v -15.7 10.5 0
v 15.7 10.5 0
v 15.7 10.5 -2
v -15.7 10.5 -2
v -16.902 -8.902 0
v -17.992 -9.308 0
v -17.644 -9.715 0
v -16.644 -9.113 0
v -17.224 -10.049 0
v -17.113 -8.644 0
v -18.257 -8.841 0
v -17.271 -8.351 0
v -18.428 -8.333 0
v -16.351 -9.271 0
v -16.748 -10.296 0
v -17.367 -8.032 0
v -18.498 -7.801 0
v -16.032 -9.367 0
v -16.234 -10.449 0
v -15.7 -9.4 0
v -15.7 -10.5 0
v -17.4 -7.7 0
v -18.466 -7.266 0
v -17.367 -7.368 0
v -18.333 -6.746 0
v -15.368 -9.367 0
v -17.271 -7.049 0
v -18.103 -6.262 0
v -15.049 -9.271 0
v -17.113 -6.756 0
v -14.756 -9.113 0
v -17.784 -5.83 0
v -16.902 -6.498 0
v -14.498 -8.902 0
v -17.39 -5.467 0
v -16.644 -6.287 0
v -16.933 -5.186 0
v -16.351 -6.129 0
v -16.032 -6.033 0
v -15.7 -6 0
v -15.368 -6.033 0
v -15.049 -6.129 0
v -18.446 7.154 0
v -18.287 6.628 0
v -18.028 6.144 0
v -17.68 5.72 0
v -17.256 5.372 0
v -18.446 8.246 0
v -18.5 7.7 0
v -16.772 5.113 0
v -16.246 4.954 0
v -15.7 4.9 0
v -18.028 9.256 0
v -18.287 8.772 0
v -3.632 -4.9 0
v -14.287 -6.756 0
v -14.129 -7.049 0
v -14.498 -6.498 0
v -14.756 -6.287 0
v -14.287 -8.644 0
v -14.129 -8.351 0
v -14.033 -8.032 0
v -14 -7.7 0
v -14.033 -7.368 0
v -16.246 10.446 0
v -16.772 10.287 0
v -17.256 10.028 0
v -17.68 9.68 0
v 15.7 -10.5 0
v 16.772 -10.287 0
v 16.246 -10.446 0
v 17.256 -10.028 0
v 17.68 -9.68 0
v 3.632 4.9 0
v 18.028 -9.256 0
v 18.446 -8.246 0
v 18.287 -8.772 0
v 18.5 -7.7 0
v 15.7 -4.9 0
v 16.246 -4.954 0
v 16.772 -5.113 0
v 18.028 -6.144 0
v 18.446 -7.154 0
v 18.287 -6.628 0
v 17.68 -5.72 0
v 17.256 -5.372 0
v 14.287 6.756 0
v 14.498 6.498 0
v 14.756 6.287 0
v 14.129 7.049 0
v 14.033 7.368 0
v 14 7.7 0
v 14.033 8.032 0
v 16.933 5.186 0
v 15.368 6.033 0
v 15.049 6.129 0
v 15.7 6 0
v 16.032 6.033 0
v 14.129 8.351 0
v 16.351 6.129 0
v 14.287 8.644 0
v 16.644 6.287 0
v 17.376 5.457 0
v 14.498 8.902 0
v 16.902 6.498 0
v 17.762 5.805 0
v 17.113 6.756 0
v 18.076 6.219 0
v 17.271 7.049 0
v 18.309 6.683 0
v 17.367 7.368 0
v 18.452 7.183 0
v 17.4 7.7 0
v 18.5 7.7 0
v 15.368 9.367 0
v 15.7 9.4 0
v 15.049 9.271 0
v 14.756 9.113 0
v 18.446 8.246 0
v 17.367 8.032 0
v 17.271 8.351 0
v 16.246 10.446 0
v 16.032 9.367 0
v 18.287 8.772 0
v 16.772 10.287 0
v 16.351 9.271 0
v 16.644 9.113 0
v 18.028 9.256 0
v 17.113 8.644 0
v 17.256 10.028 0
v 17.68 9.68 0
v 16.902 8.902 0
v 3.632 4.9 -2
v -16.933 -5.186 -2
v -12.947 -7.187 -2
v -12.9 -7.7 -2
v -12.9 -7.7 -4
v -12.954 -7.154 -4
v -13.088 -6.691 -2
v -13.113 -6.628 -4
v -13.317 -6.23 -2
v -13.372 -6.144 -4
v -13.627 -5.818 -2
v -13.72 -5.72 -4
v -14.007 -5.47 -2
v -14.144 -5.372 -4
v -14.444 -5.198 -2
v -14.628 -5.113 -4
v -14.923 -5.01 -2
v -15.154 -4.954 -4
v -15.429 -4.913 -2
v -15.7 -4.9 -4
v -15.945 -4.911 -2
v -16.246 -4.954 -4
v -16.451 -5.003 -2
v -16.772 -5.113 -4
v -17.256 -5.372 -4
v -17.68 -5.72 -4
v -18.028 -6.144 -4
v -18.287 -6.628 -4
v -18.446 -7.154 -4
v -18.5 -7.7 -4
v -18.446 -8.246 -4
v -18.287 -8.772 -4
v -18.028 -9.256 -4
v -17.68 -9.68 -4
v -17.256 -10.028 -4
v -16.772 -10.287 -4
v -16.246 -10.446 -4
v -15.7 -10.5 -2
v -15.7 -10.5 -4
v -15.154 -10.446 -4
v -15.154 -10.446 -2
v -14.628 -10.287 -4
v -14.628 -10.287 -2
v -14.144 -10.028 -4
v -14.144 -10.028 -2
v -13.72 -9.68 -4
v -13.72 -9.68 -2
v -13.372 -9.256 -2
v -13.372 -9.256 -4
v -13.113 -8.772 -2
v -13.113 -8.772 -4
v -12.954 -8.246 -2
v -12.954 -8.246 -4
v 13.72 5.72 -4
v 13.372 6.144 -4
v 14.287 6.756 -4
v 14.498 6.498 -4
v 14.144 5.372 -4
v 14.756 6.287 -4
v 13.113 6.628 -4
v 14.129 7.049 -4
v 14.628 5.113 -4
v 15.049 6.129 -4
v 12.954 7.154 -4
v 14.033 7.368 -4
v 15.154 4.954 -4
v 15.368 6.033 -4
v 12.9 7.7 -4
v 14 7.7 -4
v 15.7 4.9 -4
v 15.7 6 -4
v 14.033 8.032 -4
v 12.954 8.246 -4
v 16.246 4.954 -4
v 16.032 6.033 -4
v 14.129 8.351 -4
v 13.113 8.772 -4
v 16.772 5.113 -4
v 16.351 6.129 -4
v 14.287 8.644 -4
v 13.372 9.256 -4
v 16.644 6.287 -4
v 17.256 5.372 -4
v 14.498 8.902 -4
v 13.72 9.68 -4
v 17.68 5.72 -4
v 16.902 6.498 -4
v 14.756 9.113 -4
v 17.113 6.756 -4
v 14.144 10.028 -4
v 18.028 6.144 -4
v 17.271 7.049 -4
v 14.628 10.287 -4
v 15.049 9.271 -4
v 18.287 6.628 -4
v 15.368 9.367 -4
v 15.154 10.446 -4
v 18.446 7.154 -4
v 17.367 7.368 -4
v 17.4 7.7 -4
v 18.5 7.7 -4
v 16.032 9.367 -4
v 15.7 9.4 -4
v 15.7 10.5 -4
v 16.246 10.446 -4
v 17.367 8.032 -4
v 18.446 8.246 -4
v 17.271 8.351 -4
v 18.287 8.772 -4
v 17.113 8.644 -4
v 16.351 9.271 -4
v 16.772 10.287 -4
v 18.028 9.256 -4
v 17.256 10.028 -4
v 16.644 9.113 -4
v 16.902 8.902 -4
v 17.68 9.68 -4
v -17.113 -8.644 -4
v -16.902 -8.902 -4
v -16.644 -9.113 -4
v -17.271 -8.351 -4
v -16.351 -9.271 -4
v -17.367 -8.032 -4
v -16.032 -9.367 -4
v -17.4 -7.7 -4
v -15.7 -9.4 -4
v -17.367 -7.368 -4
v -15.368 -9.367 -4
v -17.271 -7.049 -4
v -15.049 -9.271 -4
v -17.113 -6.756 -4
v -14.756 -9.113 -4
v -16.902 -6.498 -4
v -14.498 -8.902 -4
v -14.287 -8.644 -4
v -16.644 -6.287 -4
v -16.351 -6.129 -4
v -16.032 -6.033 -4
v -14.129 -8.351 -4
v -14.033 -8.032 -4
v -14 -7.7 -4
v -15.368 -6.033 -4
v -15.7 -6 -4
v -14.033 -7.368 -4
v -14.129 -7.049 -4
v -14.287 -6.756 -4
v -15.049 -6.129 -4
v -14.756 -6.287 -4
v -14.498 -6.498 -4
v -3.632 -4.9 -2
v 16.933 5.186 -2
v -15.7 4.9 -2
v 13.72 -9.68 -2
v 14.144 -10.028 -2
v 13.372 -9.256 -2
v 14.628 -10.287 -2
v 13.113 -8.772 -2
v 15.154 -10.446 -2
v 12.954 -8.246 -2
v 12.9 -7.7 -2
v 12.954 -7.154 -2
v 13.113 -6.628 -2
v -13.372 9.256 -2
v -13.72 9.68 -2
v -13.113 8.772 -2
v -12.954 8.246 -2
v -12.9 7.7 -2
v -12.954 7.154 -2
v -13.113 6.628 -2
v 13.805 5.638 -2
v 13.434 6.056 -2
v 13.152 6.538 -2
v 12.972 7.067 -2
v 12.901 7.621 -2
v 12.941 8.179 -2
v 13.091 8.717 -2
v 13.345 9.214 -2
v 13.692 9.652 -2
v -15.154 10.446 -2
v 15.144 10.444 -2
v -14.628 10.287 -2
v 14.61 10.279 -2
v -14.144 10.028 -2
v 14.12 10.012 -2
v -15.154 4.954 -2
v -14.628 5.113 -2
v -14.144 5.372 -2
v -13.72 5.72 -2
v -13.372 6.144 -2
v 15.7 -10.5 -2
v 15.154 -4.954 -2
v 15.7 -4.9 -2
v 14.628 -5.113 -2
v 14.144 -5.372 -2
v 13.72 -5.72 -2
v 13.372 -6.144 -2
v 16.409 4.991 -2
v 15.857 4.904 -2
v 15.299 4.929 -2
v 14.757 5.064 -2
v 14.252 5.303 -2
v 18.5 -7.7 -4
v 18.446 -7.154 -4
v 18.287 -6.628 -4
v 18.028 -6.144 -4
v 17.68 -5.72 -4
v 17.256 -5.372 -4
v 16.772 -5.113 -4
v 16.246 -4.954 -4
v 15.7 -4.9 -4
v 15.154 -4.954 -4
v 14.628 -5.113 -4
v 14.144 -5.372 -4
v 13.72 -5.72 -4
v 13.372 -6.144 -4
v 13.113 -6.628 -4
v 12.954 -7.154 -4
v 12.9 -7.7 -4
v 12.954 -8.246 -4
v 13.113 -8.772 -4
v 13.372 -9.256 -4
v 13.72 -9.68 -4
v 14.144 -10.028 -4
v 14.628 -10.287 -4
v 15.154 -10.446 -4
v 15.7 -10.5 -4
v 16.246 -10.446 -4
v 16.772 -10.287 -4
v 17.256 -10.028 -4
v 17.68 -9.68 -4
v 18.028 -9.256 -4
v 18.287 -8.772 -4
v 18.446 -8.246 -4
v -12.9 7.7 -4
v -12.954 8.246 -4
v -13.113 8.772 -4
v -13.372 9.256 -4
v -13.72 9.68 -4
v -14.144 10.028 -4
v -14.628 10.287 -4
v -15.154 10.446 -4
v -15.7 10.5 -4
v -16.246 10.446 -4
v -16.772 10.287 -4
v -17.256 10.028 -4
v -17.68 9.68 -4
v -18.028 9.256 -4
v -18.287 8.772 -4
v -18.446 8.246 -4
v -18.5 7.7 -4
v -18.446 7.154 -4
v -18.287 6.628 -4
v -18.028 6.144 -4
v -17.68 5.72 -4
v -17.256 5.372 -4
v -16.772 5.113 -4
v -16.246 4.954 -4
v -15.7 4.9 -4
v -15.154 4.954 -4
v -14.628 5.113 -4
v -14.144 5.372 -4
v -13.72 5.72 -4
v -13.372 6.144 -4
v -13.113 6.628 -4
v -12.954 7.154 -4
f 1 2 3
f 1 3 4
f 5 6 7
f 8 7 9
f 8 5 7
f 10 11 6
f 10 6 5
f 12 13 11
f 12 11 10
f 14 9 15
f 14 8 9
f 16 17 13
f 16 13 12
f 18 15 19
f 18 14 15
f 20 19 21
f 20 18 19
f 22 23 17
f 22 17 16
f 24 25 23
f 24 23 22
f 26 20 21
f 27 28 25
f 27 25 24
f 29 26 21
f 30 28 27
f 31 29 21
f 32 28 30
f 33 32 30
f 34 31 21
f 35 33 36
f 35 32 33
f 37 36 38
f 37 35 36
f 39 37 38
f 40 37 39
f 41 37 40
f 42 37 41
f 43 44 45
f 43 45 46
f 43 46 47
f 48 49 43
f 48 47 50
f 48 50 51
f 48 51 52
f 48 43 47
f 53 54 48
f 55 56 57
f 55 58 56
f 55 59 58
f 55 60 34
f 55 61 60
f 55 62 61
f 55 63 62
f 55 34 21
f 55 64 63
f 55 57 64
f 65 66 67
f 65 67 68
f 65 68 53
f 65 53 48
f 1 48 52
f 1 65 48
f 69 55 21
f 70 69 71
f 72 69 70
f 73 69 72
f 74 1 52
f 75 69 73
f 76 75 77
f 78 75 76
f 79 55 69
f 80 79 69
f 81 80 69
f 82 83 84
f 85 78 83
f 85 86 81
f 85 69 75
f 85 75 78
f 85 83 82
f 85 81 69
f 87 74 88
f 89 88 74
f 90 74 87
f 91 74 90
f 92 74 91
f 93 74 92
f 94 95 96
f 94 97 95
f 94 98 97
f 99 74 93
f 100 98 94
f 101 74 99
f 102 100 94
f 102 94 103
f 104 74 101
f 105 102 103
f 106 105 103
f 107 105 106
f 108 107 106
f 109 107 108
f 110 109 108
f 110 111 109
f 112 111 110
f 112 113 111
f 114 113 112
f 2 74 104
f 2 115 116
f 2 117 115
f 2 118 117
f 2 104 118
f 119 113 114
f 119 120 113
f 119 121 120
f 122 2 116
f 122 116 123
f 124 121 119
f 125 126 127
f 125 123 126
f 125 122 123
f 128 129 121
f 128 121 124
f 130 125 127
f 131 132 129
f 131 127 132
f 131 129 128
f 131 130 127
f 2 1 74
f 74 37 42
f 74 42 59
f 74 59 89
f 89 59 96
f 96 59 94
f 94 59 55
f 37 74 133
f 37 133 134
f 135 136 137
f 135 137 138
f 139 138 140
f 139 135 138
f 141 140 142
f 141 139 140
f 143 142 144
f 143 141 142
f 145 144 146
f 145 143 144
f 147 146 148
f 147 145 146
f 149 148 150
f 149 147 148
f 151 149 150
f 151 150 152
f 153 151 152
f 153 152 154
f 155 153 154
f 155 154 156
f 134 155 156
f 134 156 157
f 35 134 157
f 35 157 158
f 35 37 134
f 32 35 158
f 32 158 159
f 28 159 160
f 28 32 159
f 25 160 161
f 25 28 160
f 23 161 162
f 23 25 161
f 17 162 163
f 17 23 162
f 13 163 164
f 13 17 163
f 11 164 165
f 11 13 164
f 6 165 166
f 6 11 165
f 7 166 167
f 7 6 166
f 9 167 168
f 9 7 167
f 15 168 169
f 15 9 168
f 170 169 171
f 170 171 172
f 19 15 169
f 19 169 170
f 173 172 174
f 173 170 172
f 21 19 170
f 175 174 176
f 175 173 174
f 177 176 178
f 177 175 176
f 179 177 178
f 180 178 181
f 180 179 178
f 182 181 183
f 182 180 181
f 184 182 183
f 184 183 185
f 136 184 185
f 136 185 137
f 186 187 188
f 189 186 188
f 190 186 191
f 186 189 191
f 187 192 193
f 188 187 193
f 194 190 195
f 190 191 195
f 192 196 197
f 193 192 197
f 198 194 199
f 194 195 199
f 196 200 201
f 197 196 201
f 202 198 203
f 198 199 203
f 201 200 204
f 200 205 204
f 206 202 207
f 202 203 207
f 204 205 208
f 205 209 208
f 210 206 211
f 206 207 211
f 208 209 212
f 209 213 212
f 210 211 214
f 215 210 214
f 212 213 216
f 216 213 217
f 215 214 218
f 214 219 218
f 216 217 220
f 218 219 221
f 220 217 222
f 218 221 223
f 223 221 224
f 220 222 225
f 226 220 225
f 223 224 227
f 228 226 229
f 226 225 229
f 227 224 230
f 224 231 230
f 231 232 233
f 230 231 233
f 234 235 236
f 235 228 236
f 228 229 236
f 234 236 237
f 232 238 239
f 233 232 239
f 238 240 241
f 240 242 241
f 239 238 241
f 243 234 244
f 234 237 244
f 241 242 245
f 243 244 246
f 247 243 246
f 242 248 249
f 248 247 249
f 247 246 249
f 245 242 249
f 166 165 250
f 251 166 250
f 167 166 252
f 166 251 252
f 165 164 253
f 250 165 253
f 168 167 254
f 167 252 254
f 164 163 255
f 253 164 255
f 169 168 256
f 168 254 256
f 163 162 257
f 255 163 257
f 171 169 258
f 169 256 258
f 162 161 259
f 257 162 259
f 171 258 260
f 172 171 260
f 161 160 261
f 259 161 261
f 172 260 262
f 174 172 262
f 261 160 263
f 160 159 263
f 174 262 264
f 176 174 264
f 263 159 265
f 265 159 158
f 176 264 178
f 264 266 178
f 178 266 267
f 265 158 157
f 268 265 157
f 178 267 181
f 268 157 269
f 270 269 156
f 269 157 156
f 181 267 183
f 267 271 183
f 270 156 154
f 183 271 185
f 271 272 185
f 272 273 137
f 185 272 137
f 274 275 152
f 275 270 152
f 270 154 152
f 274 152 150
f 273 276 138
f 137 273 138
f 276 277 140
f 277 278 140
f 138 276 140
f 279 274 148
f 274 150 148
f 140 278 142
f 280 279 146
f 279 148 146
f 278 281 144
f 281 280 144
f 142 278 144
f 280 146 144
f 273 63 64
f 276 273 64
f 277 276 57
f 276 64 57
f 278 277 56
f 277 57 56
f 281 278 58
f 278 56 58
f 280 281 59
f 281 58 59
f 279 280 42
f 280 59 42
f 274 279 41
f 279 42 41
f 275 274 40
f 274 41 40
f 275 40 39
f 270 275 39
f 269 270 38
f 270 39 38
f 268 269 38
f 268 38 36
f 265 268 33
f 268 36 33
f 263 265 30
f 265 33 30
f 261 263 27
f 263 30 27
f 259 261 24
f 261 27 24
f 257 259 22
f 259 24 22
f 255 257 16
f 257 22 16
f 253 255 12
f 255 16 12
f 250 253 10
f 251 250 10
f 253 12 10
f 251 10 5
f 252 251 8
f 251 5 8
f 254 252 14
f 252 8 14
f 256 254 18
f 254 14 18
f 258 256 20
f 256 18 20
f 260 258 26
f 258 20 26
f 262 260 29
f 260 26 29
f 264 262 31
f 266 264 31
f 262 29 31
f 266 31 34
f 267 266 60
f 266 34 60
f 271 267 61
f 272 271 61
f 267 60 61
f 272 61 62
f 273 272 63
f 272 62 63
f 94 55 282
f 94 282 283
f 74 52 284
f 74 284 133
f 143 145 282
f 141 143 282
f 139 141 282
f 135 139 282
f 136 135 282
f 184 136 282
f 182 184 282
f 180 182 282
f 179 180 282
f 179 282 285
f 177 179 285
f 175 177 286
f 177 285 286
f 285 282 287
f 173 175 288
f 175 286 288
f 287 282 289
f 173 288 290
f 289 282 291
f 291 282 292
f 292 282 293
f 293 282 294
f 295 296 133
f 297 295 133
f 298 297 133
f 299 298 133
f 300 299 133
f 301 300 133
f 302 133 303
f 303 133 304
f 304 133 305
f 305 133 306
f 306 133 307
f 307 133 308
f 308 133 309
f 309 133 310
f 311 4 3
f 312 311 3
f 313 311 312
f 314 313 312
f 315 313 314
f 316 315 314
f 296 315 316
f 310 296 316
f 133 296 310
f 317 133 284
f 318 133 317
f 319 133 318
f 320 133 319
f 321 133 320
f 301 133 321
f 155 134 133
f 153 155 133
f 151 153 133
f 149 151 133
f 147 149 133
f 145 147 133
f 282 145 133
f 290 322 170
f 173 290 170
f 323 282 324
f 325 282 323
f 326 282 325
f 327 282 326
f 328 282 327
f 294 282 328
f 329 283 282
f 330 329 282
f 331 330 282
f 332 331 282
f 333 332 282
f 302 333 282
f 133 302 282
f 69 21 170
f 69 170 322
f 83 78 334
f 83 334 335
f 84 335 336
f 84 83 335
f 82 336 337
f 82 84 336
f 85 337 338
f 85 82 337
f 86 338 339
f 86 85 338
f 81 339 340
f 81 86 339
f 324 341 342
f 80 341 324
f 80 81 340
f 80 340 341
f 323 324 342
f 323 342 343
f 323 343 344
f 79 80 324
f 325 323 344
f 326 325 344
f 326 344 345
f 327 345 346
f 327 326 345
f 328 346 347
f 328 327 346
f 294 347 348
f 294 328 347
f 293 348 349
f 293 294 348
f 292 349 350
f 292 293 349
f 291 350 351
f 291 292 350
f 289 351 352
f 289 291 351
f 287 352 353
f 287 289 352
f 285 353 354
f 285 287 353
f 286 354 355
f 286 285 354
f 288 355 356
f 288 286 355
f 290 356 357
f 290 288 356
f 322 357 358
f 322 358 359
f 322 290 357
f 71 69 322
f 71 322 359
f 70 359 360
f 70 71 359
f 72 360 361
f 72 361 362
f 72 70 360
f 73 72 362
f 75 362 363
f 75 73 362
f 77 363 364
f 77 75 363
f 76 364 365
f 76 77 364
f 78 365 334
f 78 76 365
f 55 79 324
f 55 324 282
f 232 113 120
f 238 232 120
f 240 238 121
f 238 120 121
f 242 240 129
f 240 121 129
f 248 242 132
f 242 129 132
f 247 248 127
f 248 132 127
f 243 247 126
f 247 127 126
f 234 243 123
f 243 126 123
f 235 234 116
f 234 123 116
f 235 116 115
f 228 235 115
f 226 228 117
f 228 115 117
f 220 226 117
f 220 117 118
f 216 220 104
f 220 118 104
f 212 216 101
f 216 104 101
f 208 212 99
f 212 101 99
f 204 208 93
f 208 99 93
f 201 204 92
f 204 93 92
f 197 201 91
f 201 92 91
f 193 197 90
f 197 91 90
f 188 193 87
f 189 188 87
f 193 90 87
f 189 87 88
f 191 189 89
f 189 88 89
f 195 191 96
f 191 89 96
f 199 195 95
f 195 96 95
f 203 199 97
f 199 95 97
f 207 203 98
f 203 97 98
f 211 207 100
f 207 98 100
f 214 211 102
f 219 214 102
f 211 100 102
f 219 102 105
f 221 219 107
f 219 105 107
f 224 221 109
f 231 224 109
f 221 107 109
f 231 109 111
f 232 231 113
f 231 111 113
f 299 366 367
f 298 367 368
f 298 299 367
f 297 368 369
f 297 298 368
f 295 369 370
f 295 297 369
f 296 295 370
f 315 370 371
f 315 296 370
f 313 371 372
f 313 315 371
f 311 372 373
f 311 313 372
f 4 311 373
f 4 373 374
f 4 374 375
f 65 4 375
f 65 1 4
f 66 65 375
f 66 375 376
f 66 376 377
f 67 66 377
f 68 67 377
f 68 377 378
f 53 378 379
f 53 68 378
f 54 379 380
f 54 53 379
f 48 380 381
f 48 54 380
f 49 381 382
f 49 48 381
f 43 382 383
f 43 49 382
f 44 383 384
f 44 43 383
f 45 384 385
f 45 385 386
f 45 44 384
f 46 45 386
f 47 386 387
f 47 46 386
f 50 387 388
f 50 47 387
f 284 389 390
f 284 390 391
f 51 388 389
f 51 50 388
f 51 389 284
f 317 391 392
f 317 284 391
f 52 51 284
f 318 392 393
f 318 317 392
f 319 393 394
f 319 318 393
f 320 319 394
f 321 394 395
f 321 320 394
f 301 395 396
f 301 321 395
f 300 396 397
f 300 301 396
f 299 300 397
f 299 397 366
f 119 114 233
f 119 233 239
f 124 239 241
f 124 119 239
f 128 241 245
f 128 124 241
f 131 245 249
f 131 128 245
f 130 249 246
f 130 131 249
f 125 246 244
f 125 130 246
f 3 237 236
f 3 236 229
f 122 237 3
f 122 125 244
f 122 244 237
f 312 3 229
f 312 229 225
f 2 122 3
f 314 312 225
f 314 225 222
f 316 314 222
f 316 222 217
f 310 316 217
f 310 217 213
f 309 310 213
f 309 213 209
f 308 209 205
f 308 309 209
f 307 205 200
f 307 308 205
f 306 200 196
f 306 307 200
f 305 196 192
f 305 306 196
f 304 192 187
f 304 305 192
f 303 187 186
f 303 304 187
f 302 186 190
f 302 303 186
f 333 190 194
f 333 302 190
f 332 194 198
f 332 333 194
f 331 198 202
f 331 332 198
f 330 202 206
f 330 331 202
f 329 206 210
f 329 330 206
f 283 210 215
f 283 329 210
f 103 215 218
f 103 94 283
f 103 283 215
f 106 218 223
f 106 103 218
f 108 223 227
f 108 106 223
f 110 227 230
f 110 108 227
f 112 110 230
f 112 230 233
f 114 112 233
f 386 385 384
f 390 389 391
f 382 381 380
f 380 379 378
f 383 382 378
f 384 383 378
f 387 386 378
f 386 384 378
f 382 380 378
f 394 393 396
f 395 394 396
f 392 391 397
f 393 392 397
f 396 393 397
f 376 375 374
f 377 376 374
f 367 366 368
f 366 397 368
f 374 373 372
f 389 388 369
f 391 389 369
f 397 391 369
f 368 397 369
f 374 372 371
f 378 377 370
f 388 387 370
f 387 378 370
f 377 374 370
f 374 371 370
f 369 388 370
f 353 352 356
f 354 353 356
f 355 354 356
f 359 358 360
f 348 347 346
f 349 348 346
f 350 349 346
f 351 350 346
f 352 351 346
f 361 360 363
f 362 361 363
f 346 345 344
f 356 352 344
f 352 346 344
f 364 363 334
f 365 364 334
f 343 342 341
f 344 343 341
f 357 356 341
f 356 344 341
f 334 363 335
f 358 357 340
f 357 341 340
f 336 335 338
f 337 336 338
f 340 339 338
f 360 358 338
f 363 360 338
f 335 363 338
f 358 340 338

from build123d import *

# Parameters (mm, degrees)
EXTRUDE_1007_DEPTH = 2
SKETCH_1_5_R       = 2.8
SKETCH_1_5_R_2     = 1.7
EXTRUDE_1109_DEPTH = 4


with BuildPart() as part:
    # Эскиз1 → Extrude 1007 (new body)
    with BuildSketch(Plane.XY):
        with BuildLine():
            Line((15.7, 10.5), (-15.7, 10.5))
            ThreePointArc((-15.7, 10.5), (-13.720101013, 9.679898987), (-12.9, 7.7))
            ThreePointArc((-12.9, 7.7), (-13.720101013, 5.720101013), (-15.7, 4.9))
            Line((-15.7, 4.9), (3.632157719, 4.9))
            Line((3.632157719, 4.9), (-16.932946461, -5.186070203))
            ThreePointArc((-16.932946461, -5.186070203), (-14.218826494, -5.323842378), (-12.9, -7.7))
            ThreePointArc((-12.9, -7.7), (-13.720101013, -9.679898987), (-15.7, -10.5))
            Line((-15.7, -10.5), (15.7, -10.5))
            ThreePointArc((15.7, -10.5), (12.9, -7.7), (15.7, -4.9))
            Line((15.7, -4.9), (-3.632157719, -4.9))
            Line((-3.632157719, -4.9), (16.932946461, 5.186070203))
            ThreePointArc((16.932946461, 5.186070203), (12.972455002, 7.067150662), (15.7, 10.5))
        make_face()
    extrude(amount=-EXTRUDE_1007_DEPTH)

    # Эскиз1<5> → Extrude 1109 (add)
    # profile 1 of 4: a face of its own
    with BuildSketch(Plane.XY):
        with Locations((15.7, 7.7)):
            Circle(SKETCH_1_5_R)
        with Locations((15.7, 7.7)):
            Circle(SKETCH_1_5_R_2, mode=Mode.SUBTRACT)
    # profile 2 of 4: a face of its own
    with BuildSketch(Plane.XY):
        with Locations((15.7, -7.7)):
            Circle(SKETCH_1_5_R)
    # profile 3 of 4: a face of its own
    with BuildSketch(Plane.XY):
        with Locations((-15.7, -7.7)):
            Circle(SKETCH_1_5_R)
        with Locations((-15.7, -7.7)):
            Circle(SKETCH_1_5_R_2, mode=Mode.SUBTRACT)
    # profile 4 of 4: a face of its own
    with BuildSketch(Plane.XY):
        with Locations((-15.7, 7.7)):
            Circle(SKETCH_1_5_R)
    extrude(amount=-EXTRUDE_1109_DEPTH)


solid = part.part
